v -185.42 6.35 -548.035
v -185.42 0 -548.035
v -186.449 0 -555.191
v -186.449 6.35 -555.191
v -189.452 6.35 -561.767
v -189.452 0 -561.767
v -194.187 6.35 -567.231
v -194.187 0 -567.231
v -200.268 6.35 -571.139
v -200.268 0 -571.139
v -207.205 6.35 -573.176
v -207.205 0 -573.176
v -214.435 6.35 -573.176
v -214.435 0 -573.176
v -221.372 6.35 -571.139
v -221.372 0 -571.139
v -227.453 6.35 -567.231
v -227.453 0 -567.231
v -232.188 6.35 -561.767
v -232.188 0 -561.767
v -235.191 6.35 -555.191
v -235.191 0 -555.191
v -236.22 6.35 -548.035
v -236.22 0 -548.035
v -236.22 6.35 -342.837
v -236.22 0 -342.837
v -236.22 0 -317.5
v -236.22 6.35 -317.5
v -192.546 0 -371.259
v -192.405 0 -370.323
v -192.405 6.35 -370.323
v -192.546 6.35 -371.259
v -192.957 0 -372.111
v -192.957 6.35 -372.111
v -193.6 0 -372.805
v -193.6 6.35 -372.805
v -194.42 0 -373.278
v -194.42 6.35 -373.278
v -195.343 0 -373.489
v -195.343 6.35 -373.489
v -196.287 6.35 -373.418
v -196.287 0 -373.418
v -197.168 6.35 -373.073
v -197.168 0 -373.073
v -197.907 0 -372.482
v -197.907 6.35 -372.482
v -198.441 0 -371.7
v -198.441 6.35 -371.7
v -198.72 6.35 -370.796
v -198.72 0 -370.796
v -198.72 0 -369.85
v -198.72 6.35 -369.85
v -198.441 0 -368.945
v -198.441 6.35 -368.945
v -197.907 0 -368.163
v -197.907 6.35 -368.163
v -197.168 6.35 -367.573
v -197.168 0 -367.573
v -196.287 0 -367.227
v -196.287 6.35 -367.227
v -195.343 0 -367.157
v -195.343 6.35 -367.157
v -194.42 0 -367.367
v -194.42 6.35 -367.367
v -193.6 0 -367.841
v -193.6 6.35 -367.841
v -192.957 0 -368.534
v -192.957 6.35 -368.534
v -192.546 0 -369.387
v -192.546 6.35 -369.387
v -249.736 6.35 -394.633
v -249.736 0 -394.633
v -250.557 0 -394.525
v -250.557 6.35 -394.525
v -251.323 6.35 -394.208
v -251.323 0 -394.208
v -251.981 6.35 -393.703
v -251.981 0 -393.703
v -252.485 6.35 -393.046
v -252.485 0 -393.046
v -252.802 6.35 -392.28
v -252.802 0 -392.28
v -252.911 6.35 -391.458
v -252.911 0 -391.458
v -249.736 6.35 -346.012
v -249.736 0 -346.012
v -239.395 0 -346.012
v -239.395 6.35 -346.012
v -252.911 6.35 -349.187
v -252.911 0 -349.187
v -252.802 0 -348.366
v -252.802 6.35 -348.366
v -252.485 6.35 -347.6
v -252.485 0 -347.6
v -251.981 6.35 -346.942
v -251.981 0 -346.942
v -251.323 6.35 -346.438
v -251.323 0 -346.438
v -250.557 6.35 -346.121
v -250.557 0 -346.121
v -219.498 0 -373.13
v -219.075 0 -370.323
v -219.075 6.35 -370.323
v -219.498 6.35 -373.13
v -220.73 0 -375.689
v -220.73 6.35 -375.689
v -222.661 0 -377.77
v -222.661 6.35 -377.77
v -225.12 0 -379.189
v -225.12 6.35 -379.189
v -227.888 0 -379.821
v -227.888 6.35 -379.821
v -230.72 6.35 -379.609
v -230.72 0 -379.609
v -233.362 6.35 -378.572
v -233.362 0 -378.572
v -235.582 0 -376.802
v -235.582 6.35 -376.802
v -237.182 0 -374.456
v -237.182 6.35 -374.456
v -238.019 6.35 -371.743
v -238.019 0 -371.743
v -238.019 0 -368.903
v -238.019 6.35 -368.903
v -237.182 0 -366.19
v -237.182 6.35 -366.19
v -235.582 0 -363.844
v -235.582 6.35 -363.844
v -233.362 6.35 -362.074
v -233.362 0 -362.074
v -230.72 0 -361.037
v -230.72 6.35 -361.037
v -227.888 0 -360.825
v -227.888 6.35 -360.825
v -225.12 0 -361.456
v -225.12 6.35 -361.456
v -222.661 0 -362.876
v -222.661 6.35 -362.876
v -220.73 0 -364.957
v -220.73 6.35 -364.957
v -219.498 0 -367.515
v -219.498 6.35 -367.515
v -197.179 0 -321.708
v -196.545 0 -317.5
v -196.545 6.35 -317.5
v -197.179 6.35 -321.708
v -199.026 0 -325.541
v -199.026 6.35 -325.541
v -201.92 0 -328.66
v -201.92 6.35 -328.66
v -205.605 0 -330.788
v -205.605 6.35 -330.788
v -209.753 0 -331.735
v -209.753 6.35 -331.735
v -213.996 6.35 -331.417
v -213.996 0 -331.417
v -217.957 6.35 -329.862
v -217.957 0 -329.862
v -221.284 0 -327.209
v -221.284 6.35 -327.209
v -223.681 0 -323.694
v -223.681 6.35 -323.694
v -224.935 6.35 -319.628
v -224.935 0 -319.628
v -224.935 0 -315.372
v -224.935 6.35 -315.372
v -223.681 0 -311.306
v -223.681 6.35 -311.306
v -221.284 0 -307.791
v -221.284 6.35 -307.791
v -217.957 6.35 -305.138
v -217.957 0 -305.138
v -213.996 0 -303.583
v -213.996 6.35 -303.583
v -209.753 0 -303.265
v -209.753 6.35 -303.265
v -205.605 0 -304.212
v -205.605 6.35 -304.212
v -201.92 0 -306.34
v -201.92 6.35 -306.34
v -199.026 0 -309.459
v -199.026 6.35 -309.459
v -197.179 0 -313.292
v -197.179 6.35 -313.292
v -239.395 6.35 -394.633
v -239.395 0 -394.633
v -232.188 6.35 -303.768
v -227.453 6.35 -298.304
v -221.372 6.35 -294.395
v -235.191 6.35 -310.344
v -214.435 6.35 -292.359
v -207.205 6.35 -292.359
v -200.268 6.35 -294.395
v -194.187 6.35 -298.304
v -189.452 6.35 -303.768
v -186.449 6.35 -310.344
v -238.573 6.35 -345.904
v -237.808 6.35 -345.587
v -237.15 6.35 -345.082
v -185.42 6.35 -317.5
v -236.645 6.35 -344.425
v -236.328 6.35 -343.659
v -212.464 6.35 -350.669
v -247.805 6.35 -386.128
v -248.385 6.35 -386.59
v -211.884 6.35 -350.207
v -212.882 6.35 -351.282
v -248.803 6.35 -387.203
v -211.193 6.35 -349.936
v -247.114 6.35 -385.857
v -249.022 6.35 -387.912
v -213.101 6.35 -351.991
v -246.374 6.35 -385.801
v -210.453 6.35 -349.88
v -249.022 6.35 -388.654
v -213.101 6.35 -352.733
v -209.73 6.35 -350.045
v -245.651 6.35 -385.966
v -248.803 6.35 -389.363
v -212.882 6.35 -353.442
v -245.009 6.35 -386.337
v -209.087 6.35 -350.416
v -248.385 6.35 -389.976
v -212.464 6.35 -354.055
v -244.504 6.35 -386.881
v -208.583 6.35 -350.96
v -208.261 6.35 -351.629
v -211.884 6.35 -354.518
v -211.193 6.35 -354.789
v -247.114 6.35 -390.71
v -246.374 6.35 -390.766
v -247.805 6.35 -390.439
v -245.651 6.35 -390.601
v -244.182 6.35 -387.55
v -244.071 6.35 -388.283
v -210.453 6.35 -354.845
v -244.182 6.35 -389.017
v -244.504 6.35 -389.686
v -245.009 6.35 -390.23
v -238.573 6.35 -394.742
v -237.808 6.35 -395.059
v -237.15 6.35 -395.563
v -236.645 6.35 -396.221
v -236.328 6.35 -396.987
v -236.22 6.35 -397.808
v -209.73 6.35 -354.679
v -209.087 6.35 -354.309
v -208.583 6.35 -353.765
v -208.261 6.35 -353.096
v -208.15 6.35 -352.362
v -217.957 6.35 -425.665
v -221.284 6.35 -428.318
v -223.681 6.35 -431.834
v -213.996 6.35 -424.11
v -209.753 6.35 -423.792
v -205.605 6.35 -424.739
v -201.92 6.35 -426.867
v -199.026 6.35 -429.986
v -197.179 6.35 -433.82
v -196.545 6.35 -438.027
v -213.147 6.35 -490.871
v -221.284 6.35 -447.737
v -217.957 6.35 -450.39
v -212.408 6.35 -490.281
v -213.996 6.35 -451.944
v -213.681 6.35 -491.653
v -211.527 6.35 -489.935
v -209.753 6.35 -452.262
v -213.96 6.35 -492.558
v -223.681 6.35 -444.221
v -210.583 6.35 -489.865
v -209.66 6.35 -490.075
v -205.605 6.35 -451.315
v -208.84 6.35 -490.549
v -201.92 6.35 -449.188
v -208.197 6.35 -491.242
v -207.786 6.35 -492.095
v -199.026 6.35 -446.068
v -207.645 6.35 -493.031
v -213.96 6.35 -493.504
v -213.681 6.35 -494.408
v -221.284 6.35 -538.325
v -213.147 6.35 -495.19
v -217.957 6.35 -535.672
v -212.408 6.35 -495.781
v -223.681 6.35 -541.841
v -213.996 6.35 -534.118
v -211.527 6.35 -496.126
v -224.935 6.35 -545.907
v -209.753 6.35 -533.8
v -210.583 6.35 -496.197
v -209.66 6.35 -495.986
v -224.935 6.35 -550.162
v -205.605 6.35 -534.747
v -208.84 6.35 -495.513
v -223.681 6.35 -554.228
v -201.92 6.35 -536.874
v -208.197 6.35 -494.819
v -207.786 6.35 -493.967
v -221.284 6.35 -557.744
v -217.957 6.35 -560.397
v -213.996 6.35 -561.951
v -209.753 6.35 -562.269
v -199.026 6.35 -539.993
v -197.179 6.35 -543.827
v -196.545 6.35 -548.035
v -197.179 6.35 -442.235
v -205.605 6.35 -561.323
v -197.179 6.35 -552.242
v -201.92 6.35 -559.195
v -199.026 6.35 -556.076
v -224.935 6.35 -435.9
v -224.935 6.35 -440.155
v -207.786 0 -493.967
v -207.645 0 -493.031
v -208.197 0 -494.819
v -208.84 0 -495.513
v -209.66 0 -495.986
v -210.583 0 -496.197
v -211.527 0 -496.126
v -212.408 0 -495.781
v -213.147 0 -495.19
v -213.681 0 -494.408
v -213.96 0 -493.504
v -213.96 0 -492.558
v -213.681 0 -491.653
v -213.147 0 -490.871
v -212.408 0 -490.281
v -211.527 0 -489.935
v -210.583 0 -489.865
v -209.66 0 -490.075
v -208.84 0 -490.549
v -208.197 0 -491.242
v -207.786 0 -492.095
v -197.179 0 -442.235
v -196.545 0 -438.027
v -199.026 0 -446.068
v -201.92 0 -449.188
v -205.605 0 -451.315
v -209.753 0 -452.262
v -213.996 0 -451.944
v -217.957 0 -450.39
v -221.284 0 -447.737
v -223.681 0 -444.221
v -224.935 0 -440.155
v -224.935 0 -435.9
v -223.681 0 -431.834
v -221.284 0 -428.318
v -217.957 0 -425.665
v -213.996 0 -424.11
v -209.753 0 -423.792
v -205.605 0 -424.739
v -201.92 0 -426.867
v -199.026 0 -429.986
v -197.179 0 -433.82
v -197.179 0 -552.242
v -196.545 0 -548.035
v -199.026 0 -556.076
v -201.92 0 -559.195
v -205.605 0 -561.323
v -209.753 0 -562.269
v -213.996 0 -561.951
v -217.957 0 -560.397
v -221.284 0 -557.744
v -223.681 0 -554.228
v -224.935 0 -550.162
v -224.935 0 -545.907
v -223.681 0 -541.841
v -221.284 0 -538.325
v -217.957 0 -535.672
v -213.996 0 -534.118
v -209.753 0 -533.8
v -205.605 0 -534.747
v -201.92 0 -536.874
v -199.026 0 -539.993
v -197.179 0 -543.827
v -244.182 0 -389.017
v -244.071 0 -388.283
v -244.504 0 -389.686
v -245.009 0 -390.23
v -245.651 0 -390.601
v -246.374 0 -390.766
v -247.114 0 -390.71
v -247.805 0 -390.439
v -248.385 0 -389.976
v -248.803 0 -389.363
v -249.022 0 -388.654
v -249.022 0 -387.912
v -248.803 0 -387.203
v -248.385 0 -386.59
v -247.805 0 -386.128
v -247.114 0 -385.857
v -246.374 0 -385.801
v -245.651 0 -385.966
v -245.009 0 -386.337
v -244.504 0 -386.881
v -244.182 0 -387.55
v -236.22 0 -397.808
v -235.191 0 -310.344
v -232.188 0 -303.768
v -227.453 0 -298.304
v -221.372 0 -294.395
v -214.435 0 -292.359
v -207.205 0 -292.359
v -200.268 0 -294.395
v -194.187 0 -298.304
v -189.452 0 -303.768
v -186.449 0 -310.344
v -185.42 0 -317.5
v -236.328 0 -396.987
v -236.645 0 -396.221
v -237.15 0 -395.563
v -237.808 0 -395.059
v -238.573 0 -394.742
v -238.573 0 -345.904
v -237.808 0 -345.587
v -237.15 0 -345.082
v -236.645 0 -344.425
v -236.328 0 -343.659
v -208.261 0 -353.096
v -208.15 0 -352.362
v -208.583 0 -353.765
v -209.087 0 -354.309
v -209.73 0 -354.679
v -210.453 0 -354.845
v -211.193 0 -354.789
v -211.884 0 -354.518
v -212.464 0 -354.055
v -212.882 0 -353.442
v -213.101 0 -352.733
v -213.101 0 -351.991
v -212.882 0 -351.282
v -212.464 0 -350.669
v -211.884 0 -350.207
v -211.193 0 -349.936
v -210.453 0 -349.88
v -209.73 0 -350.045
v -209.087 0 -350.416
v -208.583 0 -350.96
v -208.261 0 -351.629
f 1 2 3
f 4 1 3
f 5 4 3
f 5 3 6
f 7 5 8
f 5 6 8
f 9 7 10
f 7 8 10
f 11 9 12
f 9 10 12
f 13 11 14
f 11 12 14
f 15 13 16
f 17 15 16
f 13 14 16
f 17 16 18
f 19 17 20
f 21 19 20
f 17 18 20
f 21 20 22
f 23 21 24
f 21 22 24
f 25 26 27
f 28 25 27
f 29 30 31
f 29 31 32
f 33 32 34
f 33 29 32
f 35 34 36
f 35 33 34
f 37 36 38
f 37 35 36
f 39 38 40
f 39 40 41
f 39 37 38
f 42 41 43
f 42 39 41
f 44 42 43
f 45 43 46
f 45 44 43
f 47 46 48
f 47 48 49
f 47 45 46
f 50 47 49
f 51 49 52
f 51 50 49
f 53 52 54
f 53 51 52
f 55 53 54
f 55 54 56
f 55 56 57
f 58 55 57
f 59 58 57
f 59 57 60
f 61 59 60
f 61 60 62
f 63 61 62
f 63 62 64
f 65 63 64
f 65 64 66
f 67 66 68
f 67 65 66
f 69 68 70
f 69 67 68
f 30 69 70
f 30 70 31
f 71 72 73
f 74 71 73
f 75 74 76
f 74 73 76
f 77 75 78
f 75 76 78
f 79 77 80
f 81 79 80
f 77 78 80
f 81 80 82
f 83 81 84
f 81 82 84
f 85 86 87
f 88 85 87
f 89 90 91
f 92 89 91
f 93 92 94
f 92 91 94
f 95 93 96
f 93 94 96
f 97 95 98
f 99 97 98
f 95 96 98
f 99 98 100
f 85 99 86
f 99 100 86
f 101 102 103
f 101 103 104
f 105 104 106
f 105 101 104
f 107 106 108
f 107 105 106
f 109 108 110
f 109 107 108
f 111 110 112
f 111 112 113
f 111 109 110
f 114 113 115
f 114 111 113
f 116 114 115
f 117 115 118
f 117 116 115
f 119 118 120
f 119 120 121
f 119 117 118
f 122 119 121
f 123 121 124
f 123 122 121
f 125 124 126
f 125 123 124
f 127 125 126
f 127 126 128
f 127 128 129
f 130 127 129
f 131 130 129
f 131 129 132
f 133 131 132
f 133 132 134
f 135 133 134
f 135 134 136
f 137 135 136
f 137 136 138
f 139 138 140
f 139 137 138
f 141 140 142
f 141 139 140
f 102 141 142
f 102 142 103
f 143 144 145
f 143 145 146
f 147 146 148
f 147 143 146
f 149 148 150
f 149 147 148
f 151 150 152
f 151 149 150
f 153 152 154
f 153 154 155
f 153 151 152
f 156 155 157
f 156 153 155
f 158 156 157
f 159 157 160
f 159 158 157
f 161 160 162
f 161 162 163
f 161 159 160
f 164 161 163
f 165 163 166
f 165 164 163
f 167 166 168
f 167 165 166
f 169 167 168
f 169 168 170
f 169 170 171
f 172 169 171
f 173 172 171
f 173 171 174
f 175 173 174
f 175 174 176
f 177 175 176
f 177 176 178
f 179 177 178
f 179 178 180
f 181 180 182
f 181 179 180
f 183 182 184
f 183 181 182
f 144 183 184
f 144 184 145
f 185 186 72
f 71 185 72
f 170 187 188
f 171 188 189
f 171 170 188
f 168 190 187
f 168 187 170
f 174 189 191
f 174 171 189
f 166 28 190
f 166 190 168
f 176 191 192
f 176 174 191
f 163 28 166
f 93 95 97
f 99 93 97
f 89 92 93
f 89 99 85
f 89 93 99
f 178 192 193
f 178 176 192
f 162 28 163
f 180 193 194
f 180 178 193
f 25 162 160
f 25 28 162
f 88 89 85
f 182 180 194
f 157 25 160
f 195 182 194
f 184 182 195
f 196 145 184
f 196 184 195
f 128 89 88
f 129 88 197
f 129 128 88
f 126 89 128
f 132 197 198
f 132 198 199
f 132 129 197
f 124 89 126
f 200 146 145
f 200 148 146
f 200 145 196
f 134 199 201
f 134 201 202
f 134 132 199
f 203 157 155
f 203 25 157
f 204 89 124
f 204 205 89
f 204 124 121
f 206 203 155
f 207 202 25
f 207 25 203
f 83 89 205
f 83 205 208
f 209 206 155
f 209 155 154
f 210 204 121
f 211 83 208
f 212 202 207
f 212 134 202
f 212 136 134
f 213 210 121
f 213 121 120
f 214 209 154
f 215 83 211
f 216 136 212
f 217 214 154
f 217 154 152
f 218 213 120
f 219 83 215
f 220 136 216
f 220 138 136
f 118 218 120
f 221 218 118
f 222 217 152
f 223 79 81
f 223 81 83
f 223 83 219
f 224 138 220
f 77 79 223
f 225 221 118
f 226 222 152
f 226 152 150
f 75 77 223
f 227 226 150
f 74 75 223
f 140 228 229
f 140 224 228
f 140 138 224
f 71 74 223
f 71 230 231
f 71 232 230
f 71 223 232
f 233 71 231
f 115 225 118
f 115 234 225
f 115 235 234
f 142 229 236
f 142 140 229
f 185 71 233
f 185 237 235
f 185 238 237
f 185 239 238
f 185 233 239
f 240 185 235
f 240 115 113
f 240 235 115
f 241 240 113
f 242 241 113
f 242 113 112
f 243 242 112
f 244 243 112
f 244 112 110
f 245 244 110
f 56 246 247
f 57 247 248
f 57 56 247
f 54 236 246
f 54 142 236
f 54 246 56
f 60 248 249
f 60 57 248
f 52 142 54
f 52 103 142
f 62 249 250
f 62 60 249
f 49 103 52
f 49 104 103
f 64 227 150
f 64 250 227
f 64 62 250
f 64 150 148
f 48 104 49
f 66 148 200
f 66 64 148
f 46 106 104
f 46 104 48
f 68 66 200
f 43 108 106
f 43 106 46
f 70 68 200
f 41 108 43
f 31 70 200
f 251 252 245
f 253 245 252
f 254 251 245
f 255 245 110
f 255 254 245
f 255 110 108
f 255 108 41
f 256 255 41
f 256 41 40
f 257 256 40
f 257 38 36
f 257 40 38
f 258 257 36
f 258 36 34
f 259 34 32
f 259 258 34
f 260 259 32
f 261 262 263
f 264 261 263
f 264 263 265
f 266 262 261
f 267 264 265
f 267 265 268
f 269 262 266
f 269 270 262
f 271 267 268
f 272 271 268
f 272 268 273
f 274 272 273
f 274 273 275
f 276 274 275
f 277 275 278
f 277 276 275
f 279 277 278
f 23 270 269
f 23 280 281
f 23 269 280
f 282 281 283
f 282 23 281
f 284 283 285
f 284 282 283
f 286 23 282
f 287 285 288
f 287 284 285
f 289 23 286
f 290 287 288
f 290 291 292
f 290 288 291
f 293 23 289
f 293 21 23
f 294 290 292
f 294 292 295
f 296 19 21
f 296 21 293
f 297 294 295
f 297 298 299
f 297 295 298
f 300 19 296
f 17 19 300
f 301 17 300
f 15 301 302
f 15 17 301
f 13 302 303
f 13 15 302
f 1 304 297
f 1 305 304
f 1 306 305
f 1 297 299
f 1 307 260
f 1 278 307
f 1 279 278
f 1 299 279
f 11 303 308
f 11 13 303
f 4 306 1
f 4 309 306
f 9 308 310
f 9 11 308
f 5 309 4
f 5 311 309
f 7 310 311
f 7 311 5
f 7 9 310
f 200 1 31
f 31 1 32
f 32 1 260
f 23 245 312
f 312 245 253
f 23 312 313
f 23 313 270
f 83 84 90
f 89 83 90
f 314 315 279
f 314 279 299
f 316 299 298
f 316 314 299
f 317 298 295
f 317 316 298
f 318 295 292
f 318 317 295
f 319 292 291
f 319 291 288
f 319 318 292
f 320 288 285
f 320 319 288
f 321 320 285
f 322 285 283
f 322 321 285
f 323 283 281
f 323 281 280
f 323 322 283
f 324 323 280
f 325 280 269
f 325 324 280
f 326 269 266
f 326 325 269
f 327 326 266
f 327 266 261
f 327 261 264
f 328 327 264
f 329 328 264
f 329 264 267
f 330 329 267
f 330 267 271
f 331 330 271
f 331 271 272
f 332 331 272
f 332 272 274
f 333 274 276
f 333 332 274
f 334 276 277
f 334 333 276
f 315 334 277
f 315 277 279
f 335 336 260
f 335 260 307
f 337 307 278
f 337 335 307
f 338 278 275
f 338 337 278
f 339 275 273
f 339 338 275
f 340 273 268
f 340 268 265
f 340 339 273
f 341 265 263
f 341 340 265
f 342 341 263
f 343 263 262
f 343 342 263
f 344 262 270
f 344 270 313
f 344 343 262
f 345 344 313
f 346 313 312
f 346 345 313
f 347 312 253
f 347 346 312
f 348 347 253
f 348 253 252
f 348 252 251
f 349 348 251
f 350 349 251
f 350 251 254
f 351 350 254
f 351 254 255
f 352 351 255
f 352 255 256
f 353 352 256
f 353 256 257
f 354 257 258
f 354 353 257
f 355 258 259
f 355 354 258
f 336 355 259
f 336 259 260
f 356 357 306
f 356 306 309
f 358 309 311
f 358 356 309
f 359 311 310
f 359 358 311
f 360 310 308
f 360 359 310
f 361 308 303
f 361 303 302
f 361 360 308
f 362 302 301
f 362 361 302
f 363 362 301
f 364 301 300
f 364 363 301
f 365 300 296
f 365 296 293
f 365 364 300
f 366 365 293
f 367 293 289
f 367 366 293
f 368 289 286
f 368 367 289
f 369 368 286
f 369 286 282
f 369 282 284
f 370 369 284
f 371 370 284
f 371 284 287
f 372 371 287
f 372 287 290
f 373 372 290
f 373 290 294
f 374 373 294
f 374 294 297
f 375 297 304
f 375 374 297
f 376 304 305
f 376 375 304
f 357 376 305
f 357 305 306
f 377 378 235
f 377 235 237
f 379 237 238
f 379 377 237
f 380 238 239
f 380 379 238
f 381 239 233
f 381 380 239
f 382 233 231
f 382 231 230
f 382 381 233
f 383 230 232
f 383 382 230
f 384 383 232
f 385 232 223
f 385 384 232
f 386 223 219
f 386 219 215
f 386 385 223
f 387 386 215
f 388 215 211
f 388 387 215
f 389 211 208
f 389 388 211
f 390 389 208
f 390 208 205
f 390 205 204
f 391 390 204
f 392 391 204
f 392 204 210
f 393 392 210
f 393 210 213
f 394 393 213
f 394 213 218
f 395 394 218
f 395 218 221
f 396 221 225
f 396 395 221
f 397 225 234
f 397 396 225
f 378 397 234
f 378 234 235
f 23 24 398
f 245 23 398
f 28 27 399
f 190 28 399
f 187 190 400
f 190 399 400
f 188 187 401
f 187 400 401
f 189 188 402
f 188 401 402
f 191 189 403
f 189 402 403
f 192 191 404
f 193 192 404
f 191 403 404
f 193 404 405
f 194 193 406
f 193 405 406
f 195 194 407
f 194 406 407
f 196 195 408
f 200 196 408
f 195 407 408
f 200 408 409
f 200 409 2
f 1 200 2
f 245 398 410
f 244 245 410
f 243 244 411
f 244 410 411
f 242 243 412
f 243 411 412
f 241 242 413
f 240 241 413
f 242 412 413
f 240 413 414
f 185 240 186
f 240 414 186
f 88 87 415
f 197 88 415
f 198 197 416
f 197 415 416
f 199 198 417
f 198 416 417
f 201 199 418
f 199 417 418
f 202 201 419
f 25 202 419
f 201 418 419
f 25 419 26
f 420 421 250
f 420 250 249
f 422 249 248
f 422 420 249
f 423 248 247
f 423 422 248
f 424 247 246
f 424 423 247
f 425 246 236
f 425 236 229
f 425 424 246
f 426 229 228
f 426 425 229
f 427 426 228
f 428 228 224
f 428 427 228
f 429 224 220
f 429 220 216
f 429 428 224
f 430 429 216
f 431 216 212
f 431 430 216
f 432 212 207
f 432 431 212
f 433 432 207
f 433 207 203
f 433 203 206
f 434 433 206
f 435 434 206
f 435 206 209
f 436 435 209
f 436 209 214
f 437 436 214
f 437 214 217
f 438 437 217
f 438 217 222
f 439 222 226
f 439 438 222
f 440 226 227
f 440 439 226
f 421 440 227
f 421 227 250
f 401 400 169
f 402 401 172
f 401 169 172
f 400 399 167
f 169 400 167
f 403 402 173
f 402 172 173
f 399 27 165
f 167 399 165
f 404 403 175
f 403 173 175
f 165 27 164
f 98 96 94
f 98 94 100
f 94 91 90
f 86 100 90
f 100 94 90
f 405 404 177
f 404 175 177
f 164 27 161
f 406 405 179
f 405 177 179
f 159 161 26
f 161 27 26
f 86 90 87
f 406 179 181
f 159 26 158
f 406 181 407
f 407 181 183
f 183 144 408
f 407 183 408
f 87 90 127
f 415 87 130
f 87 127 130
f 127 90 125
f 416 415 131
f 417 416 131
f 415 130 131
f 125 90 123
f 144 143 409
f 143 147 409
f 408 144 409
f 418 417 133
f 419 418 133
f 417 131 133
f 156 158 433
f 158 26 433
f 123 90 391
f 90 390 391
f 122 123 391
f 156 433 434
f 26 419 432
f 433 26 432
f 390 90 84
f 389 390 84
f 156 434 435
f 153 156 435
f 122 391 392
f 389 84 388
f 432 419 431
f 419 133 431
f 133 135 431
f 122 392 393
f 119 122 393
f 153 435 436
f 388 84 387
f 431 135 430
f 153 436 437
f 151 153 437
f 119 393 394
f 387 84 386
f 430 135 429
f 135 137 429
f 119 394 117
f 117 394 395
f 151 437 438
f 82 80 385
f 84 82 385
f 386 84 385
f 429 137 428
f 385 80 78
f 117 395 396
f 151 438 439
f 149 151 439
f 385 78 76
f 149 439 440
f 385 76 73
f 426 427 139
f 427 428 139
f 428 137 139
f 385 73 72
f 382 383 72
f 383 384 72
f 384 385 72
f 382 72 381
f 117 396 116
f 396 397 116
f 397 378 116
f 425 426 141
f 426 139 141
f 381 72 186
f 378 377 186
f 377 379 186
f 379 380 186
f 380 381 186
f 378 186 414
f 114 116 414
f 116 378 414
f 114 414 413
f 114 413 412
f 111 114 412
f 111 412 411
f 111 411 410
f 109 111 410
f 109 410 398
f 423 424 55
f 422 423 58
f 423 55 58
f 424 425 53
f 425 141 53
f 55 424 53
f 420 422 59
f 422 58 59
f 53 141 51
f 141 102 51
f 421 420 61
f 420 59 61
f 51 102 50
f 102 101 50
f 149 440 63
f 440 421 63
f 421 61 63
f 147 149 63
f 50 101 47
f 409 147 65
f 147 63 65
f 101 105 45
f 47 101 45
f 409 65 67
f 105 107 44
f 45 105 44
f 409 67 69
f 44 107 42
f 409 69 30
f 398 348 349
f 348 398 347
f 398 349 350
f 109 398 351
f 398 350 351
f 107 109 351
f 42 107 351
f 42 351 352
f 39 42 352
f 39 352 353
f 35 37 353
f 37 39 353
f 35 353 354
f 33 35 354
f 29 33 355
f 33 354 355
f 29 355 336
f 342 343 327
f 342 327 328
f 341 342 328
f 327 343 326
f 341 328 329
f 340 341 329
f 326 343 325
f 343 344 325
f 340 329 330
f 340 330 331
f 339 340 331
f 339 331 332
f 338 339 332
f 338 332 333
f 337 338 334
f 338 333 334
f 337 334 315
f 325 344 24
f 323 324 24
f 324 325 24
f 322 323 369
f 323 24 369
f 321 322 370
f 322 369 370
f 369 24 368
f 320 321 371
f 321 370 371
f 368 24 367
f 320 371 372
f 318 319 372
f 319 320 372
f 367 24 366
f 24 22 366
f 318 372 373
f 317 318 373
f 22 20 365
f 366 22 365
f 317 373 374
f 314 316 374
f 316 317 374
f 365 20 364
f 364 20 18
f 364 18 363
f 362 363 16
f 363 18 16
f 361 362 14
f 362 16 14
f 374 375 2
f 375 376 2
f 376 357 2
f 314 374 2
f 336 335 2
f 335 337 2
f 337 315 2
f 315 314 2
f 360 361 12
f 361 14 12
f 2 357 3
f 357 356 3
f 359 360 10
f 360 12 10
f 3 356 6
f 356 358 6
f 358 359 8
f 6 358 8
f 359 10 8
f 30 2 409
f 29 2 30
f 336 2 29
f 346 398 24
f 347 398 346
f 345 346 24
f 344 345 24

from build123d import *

# Parameters (mm, degrees)
SKETCH3_R           = 14.2748
SKETCH3_R_2         = 9.525
SKETCH3_R_3         = 2.4892
SKETCH3_R_4         = 3.175
BOSS_EXTRUDE1_DEPTH = 6.35


with BuildPart() as part:
    # Sketch3 → Boss-Extrude1 (new body)
    with BuildSketch(Plane(origin=(0, 0, 0), x_dir=(1, 0, 0), z_dir=(0, 1, 0))):
        with BuildLine():
            Line((-249.735512242, 346.01236887), (-239.395, 346.01236887))
            ThreePointArc((-239.395, 346.01236887), (-237.14993597, 345.0824329), (-236.22, 342.83736887))
            Line((-236.22, 342.83736887), (-236.22, 317.5))
            ThreePointArc((-236.22, 317.5), (-210.82, 292.1), (-185.42, 317.5))
            Line((-185.42, 317.5), (-185.42, 548.034576396))
            ThreePointArc((-185.42, 548.034576396), (-210.82, 573.434576396), (-236.22, 548.034576396))
            Line((-236.22, 548.034576396), (-236.22, 397.808393354))
            ThreePointArc((-236.22, 397.808393354), (-237.14993597, 395.563329324), (-239.395, 394.633393354))
            Line((-239.395, 394.633393354), (-249.735512242, 394.633393354))
            ThreePointArc((-249.735512242, 394.633393354), (-251.980576272, 393.703457384), (-252.910512242, 391.458393354))
            Line((-252.910512242, 391.458393354), (-252.910512242, 349.18736887))
            ThreePointArc((-252.910512242, 349.18736887), (-251.980576272, 346.942304839), (-249.735512242, 346.01236887))
        make_face()
        with Locations((-210.82, 548.034576396)):
            Circle(SKETCH3_R, mode=Mode.SUBTRACT)
        with Locations((-210.82, 438.027176396)):
            Circle(SKETCH3_R, mode=Mode.SUBTRACT)
        with Locations((-210.82, 317.5)):
            Circle(SKETCH3_R, mode=Mode.SUBTRACT)
        with Locations((-228.6, 370.322881112)):
            Circle(SKETCH3_R_2, mode=Mode.SUBTRACT)
        with Locations((-246.560512242, 388.283393354)):
            Circle(SKETCH3_R_3, mode=Mode.SUBTRACT)
        with Locations((-210.639487758, 352.36236887)):
            Circle(SKETCH3_R_3, mode=Mode.SUBTRACT)
        with Locations((-210.82, 493.030876396)):
            Circle(SKETCH3_R_4, mode=Mode.SUBTRACT)
        with Locations((-195.58, 370.322881112)):
            Circle(SKETCH3_R_4, mode=Mode.SUBTRACT)
    extrude(amount=BOSS_EXTRUDE1_DEPTH)


solid = part.part
